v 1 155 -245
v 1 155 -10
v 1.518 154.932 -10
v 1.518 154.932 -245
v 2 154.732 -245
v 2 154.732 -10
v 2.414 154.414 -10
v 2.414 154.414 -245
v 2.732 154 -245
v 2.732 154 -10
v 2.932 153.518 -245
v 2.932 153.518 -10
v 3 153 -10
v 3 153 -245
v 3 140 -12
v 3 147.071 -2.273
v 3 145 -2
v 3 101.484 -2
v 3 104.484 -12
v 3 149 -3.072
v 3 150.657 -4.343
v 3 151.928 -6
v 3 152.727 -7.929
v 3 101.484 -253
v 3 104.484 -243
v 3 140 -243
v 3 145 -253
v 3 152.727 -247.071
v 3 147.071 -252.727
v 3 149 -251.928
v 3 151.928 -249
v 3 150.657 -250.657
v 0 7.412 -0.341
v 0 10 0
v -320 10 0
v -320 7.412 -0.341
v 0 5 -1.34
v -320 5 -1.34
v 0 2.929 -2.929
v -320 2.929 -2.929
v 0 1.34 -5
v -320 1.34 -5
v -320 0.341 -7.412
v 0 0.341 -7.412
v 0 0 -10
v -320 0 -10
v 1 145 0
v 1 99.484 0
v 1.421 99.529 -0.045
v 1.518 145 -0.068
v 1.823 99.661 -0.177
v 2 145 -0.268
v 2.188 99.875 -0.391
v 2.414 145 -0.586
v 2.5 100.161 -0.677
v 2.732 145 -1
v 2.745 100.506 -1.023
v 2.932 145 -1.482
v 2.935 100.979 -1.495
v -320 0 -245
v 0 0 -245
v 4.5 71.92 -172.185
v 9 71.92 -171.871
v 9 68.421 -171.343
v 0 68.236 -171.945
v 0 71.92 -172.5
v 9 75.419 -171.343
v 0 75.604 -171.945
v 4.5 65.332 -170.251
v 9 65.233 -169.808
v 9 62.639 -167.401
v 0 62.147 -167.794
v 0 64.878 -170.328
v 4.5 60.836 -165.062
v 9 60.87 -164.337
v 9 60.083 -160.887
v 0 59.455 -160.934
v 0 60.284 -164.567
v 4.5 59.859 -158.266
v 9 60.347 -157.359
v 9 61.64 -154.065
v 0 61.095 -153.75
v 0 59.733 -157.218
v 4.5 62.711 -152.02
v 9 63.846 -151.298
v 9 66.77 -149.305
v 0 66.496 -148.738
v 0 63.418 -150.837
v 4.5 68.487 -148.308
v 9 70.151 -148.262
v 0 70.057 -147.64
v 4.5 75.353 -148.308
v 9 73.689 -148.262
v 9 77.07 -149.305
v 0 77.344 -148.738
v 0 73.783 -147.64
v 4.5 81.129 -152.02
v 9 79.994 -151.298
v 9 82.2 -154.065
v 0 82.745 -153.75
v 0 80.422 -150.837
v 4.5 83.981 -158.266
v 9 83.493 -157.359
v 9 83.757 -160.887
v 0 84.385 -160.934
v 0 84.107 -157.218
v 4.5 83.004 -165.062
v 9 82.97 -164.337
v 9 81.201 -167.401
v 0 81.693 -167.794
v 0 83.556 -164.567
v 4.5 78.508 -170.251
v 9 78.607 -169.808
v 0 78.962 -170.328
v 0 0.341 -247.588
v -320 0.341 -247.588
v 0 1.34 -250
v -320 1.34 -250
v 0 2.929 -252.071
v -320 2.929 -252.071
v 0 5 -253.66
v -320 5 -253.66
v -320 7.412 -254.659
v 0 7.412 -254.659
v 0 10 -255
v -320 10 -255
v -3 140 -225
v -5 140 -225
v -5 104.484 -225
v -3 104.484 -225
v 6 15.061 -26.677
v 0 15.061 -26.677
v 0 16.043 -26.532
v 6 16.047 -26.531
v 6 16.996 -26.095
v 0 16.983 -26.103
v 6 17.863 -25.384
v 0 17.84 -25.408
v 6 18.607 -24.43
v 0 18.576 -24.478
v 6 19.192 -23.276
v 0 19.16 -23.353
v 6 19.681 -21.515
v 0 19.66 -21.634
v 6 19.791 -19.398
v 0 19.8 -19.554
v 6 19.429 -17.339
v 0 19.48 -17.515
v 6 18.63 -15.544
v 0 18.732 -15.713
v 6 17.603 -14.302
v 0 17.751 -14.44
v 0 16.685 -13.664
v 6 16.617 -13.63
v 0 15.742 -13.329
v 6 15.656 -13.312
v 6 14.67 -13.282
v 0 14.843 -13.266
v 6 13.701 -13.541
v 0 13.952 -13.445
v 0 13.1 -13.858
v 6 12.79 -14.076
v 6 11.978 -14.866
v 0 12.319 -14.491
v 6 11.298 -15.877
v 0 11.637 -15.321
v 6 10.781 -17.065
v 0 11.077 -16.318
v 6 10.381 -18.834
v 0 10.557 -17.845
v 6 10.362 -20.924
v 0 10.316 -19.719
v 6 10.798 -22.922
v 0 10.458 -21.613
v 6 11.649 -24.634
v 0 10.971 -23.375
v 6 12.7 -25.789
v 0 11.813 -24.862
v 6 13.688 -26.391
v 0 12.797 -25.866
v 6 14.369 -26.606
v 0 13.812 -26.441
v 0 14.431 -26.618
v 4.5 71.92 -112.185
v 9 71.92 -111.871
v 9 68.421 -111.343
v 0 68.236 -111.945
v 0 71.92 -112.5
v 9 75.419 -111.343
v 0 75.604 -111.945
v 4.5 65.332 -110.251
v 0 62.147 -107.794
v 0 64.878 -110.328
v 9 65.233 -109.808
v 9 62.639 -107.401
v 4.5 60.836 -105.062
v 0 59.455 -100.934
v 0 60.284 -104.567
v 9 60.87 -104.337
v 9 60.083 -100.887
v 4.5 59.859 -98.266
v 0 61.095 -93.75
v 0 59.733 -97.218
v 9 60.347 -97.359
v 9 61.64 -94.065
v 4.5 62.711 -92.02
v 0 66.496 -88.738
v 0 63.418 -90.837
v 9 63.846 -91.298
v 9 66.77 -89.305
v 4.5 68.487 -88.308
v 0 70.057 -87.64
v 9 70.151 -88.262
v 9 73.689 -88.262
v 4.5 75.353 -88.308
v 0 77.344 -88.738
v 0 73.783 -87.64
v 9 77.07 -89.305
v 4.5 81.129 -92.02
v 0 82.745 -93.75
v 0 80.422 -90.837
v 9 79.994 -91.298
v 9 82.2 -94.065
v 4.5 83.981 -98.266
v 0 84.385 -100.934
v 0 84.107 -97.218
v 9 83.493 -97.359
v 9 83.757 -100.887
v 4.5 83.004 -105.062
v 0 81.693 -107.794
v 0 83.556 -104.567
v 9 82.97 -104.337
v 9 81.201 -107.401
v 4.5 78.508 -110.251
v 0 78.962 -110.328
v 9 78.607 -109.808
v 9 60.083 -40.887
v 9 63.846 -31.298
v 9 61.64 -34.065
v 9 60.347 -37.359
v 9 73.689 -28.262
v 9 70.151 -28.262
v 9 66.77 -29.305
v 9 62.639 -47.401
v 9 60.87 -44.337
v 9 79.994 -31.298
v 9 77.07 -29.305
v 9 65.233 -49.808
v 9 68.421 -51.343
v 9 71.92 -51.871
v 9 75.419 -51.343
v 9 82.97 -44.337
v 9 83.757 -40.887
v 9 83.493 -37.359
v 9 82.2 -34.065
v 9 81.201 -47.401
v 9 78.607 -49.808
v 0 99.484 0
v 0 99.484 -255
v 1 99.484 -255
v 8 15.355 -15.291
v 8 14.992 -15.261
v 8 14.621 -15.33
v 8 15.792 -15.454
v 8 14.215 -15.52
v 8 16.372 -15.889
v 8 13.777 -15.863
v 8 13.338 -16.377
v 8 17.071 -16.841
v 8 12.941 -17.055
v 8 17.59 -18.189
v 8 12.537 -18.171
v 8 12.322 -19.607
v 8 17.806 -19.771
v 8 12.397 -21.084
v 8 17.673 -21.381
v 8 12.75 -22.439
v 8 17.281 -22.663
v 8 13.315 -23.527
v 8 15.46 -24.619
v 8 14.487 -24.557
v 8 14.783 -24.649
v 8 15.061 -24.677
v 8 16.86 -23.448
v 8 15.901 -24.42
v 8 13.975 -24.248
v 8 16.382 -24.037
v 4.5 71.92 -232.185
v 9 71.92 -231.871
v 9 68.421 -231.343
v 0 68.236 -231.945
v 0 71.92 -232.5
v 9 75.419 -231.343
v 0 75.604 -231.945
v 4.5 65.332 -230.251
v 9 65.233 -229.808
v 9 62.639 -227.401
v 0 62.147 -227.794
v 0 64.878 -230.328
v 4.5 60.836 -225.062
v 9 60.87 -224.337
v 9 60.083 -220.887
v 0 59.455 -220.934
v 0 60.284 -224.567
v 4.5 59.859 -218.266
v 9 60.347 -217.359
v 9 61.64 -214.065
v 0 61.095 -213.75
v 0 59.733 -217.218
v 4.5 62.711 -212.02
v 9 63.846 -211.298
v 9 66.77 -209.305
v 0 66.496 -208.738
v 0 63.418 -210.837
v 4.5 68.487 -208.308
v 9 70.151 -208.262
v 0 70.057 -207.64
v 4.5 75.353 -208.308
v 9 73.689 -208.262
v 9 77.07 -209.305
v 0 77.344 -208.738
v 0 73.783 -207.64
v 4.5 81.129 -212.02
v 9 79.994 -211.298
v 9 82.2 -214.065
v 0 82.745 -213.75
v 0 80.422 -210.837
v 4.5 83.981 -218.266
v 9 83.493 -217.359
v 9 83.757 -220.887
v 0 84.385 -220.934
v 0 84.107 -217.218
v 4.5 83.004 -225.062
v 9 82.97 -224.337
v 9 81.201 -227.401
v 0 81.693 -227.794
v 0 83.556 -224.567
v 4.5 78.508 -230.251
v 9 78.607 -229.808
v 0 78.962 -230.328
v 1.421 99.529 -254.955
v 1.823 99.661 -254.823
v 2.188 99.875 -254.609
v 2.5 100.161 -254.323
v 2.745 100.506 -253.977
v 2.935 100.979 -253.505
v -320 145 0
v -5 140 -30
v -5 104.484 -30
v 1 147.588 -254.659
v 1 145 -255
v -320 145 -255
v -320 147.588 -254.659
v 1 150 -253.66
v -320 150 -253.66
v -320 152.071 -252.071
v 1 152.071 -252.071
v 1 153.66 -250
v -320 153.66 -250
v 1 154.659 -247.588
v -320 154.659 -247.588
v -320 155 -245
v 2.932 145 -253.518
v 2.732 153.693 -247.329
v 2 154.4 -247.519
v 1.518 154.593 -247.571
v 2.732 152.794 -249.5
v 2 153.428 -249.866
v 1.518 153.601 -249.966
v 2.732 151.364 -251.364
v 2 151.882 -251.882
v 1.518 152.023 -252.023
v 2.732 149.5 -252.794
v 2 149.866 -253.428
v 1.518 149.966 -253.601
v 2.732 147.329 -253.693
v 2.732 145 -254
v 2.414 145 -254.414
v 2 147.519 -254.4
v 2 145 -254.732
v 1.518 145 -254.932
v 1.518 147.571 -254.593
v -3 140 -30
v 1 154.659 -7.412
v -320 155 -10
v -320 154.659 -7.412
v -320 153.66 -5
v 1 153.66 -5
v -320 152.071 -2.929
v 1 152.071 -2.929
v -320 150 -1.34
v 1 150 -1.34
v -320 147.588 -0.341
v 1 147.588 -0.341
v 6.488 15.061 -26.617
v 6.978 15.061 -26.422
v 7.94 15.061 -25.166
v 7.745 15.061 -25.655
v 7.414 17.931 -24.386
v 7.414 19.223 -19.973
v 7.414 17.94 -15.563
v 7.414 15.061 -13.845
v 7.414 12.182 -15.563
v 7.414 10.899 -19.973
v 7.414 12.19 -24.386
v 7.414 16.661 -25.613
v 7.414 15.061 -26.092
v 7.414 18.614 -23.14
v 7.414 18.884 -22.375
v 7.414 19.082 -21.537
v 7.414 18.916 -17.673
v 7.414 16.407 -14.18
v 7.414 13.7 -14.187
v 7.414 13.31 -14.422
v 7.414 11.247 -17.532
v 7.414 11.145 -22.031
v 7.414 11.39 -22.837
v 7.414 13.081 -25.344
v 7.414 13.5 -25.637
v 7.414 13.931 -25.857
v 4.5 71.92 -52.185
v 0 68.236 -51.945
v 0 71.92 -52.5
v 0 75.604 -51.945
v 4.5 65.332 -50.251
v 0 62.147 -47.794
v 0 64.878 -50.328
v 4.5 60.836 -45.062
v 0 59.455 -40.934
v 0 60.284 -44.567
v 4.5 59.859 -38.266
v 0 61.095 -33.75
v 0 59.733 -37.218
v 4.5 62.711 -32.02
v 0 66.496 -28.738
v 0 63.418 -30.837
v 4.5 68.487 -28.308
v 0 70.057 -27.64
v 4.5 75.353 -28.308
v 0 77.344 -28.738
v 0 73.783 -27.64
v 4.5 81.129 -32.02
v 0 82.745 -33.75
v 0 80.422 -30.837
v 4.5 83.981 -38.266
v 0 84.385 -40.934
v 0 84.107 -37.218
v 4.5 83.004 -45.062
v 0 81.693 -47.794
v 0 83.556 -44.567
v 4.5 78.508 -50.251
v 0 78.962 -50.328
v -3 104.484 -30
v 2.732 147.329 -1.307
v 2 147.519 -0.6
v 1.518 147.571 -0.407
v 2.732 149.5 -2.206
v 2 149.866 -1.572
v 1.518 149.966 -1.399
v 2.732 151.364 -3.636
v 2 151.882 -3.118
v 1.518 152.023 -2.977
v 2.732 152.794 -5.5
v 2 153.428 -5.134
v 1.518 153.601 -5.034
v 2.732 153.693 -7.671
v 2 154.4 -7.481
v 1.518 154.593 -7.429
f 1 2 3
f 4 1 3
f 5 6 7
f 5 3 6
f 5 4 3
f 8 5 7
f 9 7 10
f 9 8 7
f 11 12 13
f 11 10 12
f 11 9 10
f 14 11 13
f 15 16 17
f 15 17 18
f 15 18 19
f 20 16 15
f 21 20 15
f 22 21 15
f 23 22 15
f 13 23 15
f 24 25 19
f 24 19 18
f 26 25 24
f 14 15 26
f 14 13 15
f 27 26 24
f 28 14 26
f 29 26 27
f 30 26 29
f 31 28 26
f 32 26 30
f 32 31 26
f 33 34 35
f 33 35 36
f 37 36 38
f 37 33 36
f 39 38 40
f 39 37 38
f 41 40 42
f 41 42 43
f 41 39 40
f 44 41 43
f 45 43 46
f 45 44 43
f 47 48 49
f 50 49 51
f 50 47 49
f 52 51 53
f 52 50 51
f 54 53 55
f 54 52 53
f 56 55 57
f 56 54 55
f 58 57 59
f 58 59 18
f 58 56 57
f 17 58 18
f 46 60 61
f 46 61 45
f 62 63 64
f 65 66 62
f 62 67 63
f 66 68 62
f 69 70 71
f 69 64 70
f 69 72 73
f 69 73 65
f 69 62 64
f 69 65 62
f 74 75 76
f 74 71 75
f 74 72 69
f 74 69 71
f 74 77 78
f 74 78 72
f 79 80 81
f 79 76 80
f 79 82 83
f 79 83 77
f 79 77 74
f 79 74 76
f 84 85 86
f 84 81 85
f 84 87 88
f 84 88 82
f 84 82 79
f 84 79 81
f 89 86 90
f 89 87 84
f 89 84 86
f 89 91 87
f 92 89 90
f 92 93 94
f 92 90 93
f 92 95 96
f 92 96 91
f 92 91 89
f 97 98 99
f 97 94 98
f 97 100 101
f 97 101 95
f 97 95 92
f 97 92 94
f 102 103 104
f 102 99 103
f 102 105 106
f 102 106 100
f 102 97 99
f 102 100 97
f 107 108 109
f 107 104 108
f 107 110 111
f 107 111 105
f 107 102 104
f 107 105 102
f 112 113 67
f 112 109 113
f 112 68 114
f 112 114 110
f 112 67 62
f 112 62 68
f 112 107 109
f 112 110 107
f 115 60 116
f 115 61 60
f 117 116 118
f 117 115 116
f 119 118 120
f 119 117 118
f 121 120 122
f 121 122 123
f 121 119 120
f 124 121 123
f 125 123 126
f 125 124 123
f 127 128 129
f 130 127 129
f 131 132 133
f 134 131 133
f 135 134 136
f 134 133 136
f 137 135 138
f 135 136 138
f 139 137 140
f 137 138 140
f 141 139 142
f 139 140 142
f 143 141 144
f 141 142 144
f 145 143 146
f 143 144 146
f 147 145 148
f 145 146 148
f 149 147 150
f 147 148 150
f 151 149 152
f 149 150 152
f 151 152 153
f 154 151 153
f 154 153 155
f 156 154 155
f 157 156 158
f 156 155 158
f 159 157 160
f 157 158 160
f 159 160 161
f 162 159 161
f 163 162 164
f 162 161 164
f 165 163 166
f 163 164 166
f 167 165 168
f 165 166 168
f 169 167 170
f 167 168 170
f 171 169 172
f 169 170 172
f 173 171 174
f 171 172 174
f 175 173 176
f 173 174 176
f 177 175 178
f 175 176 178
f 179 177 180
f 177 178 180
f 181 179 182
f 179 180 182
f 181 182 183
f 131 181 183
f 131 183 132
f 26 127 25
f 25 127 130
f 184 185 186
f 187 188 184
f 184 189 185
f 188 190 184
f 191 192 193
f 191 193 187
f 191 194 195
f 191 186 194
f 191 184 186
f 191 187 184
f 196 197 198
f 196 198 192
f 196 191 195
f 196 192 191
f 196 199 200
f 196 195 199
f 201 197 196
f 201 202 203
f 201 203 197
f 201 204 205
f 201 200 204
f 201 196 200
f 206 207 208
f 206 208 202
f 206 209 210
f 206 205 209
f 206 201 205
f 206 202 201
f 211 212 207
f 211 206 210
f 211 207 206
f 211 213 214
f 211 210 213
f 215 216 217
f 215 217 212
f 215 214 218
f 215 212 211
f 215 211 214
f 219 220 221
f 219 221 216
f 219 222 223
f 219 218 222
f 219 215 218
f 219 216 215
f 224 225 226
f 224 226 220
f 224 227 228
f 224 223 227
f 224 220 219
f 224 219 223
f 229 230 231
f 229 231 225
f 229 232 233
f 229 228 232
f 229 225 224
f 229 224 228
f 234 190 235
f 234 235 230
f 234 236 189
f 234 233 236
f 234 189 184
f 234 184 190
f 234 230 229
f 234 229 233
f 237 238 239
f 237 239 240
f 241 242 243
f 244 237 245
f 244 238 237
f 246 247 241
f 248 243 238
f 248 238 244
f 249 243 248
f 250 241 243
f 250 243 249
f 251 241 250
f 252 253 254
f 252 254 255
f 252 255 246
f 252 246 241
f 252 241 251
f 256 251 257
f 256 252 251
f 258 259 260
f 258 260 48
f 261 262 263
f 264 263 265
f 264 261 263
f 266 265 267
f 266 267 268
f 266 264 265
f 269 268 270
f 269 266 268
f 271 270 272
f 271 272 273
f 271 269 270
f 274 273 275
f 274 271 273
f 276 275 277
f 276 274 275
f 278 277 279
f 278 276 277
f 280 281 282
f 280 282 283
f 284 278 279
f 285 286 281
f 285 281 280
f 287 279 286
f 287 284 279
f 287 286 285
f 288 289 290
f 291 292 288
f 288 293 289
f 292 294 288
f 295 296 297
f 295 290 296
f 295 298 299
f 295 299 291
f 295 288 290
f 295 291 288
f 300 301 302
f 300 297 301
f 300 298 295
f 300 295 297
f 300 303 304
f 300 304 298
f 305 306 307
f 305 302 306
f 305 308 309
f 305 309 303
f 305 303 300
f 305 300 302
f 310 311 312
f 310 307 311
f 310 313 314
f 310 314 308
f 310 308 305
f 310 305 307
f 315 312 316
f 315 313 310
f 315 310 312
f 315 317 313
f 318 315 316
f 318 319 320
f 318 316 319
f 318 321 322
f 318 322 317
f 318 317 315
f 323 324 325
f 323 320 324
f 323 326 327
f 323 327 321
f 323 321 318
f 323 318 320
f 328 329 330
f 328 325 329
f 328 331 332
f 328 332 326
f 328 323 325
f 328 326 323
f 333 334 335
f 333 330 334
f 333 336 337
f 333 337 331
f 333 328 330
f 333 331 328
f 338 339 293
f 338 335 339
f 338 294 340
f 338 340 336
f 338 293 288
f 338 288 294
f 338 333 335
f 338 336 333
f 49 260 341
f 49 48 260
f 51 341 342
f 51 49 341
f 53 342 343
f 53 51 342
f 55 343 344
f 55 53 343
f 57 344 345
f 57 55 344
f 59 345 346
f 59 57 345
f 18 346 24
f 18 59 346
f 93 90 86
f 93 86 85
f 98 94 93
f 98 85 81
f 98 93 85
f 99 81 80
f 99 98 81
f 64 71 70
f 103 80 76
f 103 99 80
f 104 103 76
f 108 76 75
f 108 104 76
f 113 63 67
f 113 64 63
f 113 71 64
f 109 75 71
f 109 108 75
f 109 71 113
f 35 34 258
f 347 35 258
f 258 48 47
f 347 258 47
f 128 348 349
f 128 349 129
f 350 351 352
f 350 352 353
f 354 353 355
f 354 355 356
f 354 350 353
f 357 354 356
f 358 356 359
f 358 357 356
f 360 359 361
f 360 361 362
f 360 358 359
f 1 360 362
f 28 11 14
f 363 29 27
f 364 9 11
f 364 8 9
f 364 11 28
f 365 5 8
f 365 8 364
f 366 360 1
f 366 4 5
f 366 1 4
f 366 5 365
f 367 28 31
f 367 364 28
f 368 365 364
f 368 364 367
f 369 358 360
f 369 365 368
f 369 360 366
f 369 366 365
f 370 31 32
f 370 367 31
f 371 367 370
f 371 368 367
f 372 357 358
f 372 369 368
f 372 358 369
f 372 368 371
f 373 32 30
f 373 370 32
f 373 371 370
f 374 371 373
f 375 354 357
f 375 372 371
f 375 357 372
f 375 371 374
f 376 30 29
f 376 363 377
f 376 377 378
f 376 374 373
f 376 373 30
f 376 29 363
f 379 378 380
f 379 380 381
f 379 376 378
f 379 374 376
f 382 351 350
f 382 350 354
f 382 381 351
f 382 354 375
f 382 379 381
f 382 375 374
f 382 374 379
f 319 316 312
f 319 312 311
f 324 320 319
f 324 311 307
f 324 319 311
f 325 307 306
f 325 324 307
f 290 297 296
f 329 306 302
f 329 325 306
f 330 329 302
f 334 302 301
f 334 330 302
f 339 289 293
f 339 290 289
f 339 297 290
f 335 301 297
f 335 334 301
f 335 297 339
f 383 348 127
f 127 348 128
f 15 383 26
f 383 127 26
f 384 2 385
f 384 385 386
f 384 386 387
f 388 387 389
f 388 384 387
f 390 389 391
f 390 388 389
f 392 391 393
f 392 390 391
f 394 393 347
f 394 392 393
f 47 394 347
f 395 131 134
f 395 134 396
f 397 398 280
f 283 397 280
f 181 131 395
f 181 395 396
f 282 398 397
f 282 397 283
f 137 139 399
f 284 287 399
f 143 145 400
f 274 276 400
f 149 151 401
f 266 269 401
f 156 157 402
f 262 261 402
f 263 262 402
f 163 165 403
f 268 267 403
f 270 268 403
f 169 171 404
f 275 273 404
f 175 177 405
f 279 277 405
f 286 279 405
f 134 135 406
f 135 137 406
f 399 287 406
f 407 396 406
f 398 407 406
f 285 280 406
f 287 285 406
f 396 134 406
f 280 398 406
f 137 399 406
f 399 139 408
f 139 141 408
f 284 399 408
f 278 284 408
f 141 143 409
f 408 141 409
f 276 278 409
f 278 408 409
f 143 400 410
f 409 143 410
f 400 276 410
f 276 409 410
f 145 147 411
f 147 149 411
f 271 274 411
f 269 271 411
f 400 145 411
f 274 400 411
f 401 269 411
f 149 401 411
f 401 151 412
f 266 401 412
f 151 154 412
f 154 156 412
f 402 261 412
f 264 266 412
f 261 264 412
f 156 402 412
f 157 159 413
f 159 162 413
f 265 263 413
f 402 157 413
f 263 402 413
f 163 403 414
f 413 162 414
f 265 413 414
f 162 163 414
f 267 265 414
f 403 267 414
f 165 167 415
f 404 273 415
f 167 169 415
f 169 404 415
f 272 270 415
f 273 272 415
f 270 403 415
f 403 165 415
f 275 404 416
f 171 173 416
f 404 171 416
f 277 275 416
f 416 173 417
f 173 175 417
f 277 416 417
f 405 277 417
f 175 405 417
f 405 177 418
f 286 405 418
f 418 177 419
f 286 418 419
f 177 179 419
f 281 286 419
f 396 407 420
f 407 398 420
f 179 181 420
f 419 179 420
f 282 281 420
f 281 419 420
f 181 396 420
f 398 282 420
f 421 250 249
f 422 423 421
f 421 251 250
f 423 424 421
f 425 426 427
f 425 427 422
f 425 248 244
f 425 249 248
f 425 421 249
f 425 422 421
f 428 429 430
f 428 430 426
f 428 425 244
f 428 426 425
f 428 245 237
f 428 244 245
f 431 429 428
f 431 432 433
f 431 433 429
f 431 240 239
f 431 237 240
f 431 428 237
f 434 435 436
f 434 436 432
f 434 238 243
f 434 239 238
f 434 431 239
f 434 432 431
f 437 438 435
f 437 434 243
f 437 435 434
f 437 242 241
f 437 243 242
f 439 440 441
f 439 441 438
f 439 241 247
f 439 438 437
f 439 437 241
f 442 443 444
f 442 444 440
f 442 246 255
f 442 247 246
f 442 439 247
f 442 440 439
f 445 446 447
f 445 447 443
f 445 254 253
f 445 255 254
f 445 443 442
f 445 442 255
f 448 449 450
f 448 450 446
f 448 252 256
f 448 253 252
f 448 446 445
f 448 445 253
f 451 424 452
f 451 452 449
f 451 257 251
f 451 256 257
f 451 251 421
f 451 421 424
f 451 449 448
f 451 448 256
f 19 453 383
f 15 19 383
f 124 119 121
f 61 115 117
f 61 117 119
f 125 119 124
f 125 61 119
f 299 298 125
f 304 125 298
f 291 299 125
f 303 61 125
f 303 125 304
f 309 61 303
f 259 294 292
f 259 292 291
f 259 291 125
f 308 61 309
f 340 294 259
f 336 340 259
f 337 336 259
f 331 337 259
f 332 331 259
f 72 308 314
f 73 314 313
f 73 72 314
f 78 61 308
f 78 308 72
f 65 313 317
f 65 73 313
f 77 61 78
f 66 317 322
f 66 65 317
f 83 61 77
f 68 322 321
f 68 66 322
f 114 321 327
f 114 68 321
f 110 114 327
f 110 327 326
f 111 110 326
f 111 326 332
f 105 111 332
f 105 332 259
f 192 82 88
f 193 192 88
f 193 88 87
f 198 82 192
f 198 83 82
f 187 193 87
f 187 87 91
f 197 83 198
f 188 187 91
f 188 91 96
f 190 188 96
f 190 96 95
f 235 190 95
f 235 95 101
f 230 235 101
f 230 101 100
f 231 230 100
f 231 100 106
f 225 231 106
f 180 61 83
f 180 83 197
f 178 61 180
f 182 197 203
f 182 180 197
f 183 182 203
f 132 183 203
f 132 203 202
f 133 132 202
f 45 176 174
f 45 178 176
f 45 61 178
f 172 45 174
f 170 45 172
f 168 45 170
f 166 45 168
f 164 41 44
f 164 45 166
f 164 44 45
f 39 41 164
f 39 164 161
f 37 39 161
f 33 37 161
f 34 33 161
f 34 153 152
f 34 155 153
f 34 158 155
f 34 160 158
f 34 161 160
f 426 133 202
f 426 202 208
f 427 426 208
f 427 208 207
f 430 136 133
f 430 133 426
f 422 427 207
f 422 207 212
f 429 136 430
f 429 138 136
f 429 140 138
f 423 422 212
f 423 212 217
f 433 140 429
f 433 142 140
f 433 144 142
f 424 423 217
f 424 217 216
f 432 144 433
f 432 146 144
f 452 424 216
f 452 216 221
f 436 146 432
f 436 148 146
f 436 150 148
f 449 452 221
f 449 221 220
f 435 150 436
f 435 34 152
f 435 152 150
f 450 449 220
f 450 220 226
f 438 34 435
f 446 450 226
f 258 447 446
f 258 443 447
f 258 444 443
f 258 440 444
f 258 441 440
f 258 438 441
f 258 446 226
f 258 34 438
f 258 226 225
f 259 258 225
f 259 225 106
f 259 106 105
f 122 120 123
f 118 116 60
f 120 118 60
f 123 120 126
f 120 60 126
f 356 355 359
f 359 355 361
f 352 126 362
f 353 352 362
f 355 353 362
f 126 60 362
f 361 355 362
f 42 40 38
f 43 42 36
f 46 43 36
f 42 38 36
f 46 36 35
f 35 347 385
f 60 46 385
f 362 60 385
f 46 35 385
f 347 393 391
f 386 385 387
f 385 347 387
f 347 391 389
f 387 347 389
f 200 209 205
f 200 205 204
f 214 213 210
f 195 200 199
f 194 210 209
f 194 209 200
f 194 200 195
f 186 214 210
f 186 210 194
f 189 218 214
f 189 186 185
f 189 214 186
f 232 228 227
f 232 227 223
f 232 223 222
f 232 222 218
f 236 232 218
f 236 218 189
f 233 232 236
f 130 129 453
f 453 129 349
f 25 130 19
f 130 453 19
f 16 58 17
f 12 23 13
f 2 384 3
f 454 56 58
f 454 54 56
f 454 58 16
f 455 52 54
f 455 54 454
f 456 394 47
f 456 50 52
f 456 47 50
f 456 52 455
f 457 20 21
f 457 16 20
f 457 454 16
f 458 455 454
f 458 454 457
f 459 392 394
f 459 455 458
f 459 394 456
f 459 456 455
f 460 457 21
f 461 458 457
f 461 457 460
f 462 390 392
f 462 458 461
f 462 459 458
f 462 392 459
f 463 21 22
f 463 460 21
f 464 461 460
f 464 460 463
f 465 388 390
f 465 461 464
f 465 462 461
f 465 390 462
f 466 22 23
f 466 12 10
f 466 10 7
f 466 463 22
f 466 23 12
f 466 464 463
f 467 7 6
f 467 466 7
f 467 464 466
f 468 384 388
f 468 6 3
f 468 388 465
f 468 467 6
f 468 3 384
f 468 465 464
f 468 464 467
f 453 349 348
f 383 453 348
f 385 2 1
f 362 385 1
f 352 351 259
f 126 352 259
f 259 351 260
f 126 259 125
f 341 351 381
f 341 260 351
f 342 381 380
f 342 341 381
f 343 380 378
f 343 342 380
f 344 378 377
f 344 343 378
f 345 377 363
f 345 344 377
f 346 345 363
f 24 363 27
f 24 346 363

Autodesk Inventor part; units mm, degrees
ref_plane "YZ Plane" through (0, 0, 0) normal (1, 0, 0) x (0, 1, 0)
ref_plane "XZ Plane" through (0, 0, 0) normal (0, 1, 0) x (-1, 0, 0)
ref_plane "XY Plane" through (0, 0, 0) normal (0, 0, 1) x (1, 0, 0)
sketch "Sketch1" plane through (0, 0, 0) normal (1, 0, 0) x (0, 1, 0)
  line L0 (0, 0) -> (155, 0)
  line L1 (155, 0) -> (155, -255)
  line L2 (155, -255) -> (0, -255)
  line L3 (0, -255) -> (0, 0)
  dimension "d1" = 255
  dimension "d2" = 155
extrude "Extrusion1" add sketch "Sketch1" against normal blind 320
sketch "Sketch2" plane through (0, 0, 0) normal (1, 0, 0) x (0, 0, -1)
  line L0 (0, 0) -> (0, 155) projected
  line L1 (255, 155) -> (255, 0) projected
  line L2 (0, 155) -> (255, 155)
  line L3 (255, 155) -> (255, 99.4837)
  line L4 (255, 99.4837) -> (0, 99.4837)
  line L5 (0, 99.4837) -> (0, 155)
  line L6 (30, 140) -> (225, 140)
  line L7 (225, 140) -> (225, 104.4837)
  line L8 (225, 104.4837) -> (30, 104.4837)
  line L9 (30, 104.4837) -> (30, 140)
  dimension "d8" = 15
  dimension "d9" = 5
  dimension "d10" = 30
  dimension "d11" = 30
extrude "Extrusion2" add sketch "Sketch2" along normal blind 3 contours L0 L2 L1 L4 | L6 L7 L8 L9
fillet "Fillet1" radius 2 4 edges at (3, 155, -127.5) (3, 127.2418, 0) (3, 127.2418, -255) (3, 99.4837, -127.5)
extrude "Extrusion3" cut sketch "Sketch2" along normal blind 3 and the other way blind 5 contours L6 L7 L8 L9
chamfer "Chamfer2" distance 18 distance2 6 1 edges at (3, 122.2418, -30) measured on face at (3, 148.6667, -95)
chamfer "Chamfer3" distance 18 distance2 6 1 edges at (3, 122.2418, -225) measured on face at (3, 148.6667, -95)
sketch "Sketch3" plane through (0, 0, 0) normal (1, 0, 0) x (0, 0, -1)
  ellipse E0 centre (19.9684, 15.0609) end of major axis (26.6774, 15.0609) minor radius 4.7478
  circle A0 centre (40, 71.92) radius 12.5
  line L0 (0, 0) -> (0, 99.4837) projected
  dimension "d25" = 25
  dimension "d34" = 40
extrude "Extrusion4" add sketch "Sketch3" along normal blind 8 contours E0
fillet "Fillet2" radius 2 1 edges at (8, 15.0609, -13.2594)
extrude "Extrusion5" add sketch "Sketch3" along normal blind 9 draft -4 contours A0
pattern_linear "Rectangular Pattern1" count 4 spacing 60 along (0, 0, -1) of "Extrusion5"
fillet "Fillet3" radius 10 6 edges at (-160, 0, 0) (2.4142, 154.4142, -0.5858) (-159.5, 155, 0) (-160, 0, -255) (2.4142, 154.4142, -254.4142) (-159.5, 155, -255)
equation "\"d11\" = d10"
properties part number "labortap1"
